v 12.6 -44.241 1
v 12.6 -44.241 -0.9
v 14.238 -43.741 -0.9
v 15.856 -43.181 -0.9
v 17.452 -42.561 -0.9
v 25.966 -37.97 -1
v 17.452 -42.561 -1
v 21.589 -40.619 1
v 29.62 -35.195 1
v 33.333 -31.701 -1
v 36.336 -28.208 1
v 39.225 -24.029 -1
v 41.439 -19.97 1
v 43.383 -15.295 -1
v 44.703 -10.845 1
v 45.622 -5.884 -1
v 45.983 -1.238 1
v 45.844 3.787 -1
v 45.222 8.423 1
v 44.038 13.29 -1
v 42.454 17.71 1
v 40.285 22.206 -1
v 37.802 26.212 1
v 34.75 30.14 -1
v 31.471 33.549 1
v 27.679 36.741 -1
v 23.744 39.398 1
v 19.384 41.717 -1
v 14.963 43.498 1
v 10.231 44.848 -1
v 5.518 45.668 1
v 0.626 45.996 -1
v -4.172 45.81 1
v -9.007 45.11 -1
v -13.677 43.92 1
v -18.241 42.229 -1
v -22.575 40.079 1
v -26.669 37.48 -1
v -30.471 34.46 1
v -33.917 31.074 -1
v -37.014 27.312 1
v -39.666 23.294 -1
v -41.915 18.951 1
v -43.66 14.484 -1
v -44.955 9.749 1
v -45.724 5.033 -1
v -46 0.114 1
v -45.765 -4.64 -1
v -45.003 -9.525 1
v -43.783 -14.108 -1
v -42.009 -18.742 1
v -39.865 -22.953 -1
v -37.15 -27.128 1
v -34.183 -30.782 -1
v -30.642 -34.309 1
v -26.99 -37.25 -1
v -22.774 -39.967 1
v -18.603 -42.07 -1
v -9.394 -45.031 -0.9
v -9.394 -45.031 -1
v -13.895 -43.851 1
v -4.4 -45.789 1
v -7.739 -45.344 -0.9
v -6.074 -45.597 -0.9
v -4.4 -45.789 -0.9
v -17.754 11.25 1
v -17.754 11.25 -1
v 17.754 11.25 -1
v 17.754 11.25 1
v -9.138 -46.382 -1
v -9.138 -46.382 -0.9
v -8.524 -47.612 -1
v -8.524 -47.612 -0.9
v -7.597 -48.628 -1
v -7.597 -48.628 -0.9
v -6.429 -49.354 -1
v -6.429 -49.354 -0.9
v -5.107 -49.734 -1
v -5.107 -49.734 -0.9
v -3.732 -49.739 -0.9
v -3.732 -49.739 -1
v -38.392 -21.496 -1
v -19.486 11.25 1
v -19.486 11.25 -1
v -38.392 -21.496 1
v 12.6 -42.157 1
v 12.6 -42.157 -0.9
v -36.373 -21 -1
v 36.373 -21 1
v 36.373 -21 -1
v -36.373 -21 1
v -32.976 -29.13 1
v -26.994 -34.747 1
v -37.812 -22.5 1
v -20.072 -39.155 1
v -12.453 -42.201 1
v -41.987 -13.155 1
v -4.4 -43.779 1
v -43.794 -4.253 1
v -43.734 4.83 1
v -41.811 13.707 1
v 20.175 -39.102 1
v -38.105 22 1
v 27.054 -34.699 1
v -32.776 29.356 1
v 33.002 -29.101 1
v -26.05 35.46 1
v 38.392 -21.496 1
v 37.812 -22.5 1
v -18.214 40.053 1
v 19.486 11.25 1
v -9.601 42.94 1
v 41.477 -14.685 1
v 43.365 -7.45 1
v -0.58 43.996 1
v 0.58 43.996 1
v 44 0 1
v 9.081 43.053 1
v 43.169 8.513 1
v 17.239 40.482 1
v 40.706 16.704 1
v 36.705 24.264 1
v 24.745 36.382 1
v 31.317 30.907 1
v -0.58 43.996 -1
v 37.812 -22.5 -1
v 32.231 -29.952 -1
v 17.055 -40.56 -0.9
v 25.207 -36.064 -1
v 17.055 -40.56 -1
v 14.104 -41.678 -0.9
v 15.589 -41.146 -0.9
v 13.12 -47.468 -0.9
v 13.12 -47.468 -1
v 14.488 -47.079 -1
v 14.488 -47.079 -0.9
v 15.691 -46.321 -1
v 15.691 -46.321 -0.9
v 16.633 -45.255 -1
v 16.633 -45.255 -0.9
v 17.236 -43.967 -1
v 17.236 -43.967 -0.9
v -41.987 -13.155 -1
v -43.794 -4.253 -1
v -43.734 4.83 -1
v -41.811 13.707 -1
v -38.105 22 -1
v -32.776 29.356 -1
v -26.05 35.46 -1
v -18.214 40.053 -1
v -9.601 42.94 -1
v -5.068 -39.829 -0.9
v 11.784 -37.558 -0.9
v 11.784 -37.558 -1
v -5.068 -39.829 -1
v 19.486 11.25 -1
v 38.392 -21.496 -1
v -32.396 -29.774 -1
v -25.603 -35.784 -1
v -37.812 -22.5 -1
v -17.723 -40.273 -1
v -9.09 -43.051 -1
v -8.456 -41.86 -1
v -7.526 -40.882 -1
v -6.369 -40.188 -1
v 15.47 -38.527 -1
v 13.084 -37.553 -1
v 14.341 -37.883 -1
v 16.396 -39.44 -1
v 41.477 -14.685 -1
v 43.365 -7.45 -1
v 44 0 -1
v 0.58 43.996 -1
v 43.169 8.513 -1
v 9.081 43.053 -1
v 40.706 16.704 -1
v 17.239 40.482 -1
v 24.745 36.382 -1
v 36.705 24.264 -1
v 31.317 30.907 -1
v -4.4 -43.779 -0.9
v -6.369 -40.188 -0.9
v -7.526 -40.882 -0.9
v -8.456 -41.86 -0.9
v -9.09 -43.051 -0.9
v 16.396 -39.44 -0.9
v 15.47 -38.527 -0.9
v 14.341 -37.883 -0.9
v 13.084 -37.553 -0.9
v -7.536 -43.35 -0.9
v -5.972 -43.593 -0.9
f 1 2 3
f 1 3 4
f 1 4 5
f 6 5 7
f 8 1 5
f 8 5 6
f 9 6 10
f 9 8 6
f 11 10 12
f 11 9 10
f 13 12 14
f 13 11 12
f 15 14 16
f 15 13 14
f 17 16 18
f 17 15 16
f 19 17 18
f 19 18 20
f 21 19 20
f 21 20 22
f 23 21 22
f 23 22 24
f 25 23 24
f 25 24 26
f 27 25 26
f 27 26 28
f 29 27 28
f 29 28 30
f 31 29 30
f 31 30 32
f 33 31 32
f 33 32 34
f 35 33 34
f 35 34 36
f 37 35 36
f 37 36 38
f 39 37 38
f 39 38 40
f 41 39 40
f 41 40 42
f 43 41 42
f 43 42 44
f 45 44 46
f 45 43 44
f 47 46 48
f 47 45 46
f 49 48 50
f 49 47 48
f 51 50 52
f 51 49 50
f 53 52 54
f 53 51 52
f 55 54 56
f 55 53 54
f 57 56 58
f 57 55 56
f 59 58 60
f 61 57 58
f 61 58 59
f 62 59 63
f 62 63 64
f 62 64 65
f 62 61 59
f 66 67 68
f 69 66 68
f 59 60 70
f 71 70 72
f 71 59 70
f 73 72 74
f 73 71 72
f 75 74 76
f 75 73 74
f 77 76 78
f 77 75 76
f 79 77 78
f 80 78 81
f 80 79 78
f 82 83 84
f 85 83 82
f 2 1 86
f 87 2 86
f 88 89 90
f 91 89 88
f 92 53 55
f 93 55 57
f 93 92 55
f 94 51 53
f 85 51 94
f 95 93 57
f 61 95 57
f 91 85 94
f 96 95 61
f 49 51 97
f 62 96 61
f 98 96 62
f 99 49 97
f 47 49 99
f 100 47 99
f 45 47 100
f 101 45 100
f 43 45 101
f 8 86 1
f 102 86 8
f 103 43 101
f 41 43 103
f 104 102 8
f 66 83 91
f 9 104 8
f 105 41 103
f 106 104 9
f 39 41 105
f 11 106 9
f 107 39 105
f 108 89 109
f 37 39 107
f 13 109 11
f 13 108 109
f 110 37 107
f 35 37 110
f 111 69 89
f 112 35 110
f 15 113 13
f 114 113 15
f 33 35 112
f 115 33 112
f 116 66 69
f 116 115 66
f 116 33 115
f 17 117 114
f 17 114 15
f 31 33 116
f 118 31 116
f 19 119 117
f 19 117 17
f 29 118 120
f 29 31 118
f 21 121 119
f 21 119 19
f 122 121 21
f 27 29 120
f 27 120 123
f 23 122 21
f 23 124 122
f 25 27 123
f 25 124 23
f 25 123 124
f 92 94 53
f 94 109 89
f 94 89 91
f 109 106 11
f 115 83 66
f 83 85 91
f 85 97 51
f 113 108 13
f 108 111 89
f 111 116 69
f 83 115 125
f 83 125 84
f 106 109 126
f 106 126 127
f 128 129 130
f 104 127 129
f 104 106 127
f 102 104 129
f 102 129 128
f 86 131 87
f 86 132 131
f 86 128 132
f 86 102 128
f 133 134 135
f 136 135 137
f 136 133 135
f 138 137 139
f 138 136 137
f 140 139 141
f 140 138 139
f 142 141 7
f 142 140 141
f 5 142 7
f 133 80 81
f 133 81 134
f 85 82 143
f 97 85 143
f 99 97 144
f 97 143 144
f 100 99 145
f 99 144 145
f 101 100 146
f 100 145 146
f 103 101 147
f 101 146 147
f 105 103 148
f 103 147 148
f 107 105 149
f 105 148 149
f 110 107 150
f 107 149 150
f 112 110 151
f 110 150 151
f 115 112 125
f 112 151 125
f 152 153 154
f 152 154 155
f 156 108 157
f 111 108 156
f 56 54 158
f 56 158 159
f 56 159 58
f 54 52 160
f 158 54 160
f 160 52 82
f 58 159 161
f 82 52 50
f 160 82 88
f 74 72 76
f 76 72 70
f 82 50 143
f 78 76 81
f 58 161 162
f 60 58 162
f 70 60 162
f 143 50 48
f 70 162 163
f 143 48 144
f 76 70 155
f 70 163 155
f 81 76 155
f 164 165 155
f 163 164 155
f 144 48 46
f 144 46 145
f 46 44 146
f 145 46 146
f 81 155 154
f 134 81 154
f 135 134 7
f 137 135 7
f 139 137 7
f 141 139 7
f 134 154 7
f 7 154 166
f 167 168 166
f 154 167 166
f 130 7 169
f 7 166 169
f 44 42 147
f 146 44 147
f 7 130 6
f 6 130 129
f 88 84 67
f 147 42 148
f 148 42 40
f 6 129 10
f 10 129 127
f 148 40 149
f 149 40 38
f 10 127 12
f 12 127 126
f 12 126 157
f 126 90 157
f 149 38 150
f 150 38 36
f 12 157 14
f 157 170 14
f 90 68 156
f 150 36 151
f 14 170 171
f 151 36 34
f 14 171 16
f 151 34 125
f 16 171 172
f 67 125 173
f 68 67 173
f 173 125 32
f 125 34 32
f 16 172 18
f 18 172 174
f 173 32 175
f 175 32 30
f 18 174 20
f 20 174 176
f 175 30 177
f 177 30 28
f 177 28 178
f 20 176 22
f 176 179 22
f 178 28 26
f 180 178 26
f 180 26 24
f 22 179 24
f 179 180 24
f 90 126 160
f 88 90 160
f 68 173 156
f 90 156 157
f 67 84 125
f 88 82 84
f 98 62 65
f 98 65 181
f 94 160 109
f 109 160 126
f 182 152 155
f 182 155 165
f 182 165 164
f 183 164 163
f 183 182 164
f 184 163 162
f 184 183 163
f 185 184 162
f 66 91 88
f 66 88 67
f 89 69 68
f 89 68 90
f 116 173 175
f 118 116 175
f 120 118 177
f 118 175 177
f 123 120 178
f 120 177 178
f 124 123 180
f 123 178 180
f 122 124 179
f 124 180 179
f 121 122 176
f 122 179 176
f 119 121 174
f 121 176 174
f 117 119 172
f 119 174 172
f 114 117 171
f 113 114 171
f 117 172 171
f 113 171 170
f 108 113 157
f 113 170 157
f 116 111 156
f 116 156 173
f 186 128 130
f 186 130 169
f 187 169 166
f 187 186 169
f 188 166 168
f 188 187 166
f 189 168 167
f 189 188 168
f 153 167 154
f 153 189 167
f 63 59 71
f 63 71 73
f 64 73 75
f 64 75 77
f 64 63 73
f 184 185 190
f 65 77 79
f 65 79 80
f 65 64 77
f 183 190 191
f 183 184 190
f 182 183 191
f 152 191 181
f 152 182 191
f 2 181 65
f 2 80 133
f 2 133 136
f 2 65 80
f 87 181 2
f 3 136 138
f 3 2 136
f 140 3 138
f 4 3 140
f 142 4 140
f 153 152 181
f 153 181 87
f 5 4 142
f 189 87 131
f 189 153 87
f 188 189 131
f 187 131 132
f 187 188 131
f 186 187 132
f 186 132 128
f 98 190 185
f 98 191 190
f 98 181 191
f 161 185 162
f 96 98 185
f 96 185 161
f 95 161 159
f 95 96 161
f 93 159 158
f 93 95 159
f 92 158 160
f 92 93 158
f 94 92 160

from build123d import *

# Parameters (mm, degrees)
F0_R     = 46
F1_DEPTH = 1
F2_W     = 17
F2_H     = 23.0149852611
F3_DEPTH = 12.5
F5_START = -0.9
F5_DEPTH = 0.1


with BuildPart() as f1:
    # F0 (on Top) → F1 (new body, symmetric)
    with BuildSketch(Plane.XY):
        Circle(F0_R)
        with BuildLine():
            ThreePointArc((0, 45), (31.8198051534, 31.8198051534), (45, 0))
            ThreePointArc((45, 0), (43.466662183, -11.6468570296), (38.9711431703, -22.5))
            ThreePointArc((38.9711431703, -22.5), (0, -45), (-38.9711431703, -22.5))
            ThreePointArc((-38.9711431703, -22.5), (-38.9711431703, 22.5), (0, 45))
        make_face(mode=Mode.SUBTRACT)
        with BuildLine():
            Line((-0.5795540246, 43.9961829837), (0, 45))
            ThreePointArc((0, 45), (-38.9711431703, 22.5), (-38.9711431703, -22.5))
            Line((-38.9711431703, -22.5), (-38.3915891457, -21.4961829837))
            ThreePointArc((-38.3915891457, -21.4961829837), (-38.1051177665, 22), (-0.5795540246, 43.9961829837))
        make_face()
        with BuildLine():
            ThreePointArc((37.8120351211, -22.5), (38.1051177665, -22), (38.3915891457, -21.4961829837))
            Line((38.3915891457, -21.4961829837), (19.4855715851, 11.25))
            Line((19.4855715851, 11.25), (17.7535207776, 11.25))
            Line((17.7535207776, 11.25), (36.3730669589, -21))
            Line((36.3730669589, -21), (-36.3730669589, -21))
            Line((-36.3730669589, -21), (-17.7535207776, 11.25))
            Line((-17.7535207776, 11.25), (-19.4855715851, 11.25))
            Line((-19.4855715851, 11.25), (-38.3915891457, -21.4961829837))
            ThreePointArc((-38.3915891457, -21.4961829837), (-38.1051177665, -22), (-37.8120351211, -22.5))
            Line((-37.8120351211, -22.5), (37.8120351211, -22.5))
        make_face()
        with BuildLine():
            Line((19.4855715851, 11.25), (0.5795540246, 43.9961829837))
            ThreePointArc((0.5795540246, 43.9961829837), (0, 44), (-0.5795540246, 43.9961829837))
            Line((-0.5795540246, 43.9961829837), (-19.4855715851, 11.25))
            Line((-19.4855715851, 11.25), (-17.7535207776, 11.25))
            Line((-17.7535207776, 11.25), (0, 42))
            Line((0, 42), (17.7535207776, 11.25))
            Line((17.7535207776, 11.25), (19.4855715851, 11.25))
        make_face()
        with BuildLine():
            ThreePointArc((38.9711431703, -22.5), (43.466662183, -11.6468570296), (45, 0))
            ThreePointArc((45, 0), (31.8198051534, 31.8198051534), (0, 45))
            Line((0, 45), (0.5795540246, 43.9961829837))
            ThreePointArc((0.5795540246, 43.9961829837), (31.3169313398, 30.9071158709), (44, 0))
            ThreePointArc((44, 0), (42.5748160443, -11.107881832), (38.3915891457, -21.4961829837))
            Line((38.3915891457, -21.4961829837), (38.9711431703, -22.5))
        make_face()
        with BuildLine():
            ThreePointArc((-38.9711431703, -22.5), (0, -45), (38.9711431703, -22.5))
            Line((38.9711431703, -22.5), (37.8120351211, -22.5))
            ThreePointArc((37.8120351211, -22.5), (0, -44), (-37.8120351211, -22.5))
            Line((-37.8120351211, -22.5), (-38.9711431703, -22.5))
        make_face()
        with BuildLine():
            Line((37.8120351211, -22.5), (38.9711431703, -22.5))
            Line((38.9711431703, -22.5), (38.3915891457, -21.4961829837))
            ThreePointArc((38.3915891457, -21.4961829837), (38.1051177665, -22), (37.8120351211, -22.5))
        make_face()
        with BuildLine():
            Line((0.5795540246, 43.9961829837), (0, 45))
            Line((0, 45), (-0.5795540246, 43.9961829837))
            ThreePointArc((-0.5795540246, 43.9961829837), (0, 44), (0.5795540246, 43.9961829837))
        make_face()
        with BuildLine():
            Line((-38.3915891457, -21.4961829837), (-38.9711431703, -22.5))
            Line((-38.9711431703, -22.5), (-37.8120351211, -22.5))
            ThreePointArc((-37.8120351211, -22.5), (-38.1051177665, -22), (-38.3915891457, -21.4961829837))
        make_face()
        Polygon((-17.7535207776, 11.25), (17.7535207776, 11.25), (0, 42), align=None)
    extrude(amount=F1_DEPTH, both=True)

    # F2 (on Top) → F3 (cut, symmetric)
    with BuildSketch(Plane.XY):
        with Locations((4.1, -46.7491300095)):
            Rectangle(F2_W, F2_H)
    extrude(amount=F3_DEPTH, both=True, mode=Mode.SUBTRACT)

    # F4 (on Top) → F5 (join)
    with BuildSketch(Plane.XY.offset(F5_START)):
        with BuildLine():
            ThreePointArc((-3.73206699, -49.7394501678), (-0.6357162003, -48.0751864298), (0.6, -44.7842644504))
            ThreePointArc((0.6, -44.7842644504), (-1.1090780205, -41.0199806506), (-5.06793301, -39.8290787329))
            ThreePointArc((-5.06793301, -39.8290787329), (-9.3551857174, -45.4521974603), (-3.73206699, -49.7394501678))
        make_face()
        with BuildLine():
            ThreePointArc((-5.06793301, -39.8290787329), (-1.1090780205, -41.0199806506), (0.6, -44.7842644504))
            ThreePointArc((0.6, -44.7842644504), (-0.6357162003, -48.0751864298), (-3.73206699, -49.7394501678))
            Line((-3.73206699, -49.7394501678), (13.1197539442, -47.4679132119))
            ThreePointArc((13.1197539442, -47.4679132119), (7.4966352168, -43.1806605044), (11.7838879242, -37.557541777))
            Line((11.7838879242, -37.557541777), (-5.06793301, -39.8290787329))
        make_face()
        with BuildLine():
            ThreePointArc((17.4518209342, -42.5127274945), (15.7427429137, -38.7484436947), (11.7838879242, -37.557541777))
            ThreePointArc((11.7838879242, -37.557541777), (7.4966352168, -43.1806605044), (13.1197539442, -47.4679132119))
            ThreePointArc((13.1197539442, -47.4679132119), (16.216104734, -45.8036494739), (17.4518209342, -42.5127274945))
        make_face()
    extrude(amount=-F5_DEPTH)


solid = f1.part
